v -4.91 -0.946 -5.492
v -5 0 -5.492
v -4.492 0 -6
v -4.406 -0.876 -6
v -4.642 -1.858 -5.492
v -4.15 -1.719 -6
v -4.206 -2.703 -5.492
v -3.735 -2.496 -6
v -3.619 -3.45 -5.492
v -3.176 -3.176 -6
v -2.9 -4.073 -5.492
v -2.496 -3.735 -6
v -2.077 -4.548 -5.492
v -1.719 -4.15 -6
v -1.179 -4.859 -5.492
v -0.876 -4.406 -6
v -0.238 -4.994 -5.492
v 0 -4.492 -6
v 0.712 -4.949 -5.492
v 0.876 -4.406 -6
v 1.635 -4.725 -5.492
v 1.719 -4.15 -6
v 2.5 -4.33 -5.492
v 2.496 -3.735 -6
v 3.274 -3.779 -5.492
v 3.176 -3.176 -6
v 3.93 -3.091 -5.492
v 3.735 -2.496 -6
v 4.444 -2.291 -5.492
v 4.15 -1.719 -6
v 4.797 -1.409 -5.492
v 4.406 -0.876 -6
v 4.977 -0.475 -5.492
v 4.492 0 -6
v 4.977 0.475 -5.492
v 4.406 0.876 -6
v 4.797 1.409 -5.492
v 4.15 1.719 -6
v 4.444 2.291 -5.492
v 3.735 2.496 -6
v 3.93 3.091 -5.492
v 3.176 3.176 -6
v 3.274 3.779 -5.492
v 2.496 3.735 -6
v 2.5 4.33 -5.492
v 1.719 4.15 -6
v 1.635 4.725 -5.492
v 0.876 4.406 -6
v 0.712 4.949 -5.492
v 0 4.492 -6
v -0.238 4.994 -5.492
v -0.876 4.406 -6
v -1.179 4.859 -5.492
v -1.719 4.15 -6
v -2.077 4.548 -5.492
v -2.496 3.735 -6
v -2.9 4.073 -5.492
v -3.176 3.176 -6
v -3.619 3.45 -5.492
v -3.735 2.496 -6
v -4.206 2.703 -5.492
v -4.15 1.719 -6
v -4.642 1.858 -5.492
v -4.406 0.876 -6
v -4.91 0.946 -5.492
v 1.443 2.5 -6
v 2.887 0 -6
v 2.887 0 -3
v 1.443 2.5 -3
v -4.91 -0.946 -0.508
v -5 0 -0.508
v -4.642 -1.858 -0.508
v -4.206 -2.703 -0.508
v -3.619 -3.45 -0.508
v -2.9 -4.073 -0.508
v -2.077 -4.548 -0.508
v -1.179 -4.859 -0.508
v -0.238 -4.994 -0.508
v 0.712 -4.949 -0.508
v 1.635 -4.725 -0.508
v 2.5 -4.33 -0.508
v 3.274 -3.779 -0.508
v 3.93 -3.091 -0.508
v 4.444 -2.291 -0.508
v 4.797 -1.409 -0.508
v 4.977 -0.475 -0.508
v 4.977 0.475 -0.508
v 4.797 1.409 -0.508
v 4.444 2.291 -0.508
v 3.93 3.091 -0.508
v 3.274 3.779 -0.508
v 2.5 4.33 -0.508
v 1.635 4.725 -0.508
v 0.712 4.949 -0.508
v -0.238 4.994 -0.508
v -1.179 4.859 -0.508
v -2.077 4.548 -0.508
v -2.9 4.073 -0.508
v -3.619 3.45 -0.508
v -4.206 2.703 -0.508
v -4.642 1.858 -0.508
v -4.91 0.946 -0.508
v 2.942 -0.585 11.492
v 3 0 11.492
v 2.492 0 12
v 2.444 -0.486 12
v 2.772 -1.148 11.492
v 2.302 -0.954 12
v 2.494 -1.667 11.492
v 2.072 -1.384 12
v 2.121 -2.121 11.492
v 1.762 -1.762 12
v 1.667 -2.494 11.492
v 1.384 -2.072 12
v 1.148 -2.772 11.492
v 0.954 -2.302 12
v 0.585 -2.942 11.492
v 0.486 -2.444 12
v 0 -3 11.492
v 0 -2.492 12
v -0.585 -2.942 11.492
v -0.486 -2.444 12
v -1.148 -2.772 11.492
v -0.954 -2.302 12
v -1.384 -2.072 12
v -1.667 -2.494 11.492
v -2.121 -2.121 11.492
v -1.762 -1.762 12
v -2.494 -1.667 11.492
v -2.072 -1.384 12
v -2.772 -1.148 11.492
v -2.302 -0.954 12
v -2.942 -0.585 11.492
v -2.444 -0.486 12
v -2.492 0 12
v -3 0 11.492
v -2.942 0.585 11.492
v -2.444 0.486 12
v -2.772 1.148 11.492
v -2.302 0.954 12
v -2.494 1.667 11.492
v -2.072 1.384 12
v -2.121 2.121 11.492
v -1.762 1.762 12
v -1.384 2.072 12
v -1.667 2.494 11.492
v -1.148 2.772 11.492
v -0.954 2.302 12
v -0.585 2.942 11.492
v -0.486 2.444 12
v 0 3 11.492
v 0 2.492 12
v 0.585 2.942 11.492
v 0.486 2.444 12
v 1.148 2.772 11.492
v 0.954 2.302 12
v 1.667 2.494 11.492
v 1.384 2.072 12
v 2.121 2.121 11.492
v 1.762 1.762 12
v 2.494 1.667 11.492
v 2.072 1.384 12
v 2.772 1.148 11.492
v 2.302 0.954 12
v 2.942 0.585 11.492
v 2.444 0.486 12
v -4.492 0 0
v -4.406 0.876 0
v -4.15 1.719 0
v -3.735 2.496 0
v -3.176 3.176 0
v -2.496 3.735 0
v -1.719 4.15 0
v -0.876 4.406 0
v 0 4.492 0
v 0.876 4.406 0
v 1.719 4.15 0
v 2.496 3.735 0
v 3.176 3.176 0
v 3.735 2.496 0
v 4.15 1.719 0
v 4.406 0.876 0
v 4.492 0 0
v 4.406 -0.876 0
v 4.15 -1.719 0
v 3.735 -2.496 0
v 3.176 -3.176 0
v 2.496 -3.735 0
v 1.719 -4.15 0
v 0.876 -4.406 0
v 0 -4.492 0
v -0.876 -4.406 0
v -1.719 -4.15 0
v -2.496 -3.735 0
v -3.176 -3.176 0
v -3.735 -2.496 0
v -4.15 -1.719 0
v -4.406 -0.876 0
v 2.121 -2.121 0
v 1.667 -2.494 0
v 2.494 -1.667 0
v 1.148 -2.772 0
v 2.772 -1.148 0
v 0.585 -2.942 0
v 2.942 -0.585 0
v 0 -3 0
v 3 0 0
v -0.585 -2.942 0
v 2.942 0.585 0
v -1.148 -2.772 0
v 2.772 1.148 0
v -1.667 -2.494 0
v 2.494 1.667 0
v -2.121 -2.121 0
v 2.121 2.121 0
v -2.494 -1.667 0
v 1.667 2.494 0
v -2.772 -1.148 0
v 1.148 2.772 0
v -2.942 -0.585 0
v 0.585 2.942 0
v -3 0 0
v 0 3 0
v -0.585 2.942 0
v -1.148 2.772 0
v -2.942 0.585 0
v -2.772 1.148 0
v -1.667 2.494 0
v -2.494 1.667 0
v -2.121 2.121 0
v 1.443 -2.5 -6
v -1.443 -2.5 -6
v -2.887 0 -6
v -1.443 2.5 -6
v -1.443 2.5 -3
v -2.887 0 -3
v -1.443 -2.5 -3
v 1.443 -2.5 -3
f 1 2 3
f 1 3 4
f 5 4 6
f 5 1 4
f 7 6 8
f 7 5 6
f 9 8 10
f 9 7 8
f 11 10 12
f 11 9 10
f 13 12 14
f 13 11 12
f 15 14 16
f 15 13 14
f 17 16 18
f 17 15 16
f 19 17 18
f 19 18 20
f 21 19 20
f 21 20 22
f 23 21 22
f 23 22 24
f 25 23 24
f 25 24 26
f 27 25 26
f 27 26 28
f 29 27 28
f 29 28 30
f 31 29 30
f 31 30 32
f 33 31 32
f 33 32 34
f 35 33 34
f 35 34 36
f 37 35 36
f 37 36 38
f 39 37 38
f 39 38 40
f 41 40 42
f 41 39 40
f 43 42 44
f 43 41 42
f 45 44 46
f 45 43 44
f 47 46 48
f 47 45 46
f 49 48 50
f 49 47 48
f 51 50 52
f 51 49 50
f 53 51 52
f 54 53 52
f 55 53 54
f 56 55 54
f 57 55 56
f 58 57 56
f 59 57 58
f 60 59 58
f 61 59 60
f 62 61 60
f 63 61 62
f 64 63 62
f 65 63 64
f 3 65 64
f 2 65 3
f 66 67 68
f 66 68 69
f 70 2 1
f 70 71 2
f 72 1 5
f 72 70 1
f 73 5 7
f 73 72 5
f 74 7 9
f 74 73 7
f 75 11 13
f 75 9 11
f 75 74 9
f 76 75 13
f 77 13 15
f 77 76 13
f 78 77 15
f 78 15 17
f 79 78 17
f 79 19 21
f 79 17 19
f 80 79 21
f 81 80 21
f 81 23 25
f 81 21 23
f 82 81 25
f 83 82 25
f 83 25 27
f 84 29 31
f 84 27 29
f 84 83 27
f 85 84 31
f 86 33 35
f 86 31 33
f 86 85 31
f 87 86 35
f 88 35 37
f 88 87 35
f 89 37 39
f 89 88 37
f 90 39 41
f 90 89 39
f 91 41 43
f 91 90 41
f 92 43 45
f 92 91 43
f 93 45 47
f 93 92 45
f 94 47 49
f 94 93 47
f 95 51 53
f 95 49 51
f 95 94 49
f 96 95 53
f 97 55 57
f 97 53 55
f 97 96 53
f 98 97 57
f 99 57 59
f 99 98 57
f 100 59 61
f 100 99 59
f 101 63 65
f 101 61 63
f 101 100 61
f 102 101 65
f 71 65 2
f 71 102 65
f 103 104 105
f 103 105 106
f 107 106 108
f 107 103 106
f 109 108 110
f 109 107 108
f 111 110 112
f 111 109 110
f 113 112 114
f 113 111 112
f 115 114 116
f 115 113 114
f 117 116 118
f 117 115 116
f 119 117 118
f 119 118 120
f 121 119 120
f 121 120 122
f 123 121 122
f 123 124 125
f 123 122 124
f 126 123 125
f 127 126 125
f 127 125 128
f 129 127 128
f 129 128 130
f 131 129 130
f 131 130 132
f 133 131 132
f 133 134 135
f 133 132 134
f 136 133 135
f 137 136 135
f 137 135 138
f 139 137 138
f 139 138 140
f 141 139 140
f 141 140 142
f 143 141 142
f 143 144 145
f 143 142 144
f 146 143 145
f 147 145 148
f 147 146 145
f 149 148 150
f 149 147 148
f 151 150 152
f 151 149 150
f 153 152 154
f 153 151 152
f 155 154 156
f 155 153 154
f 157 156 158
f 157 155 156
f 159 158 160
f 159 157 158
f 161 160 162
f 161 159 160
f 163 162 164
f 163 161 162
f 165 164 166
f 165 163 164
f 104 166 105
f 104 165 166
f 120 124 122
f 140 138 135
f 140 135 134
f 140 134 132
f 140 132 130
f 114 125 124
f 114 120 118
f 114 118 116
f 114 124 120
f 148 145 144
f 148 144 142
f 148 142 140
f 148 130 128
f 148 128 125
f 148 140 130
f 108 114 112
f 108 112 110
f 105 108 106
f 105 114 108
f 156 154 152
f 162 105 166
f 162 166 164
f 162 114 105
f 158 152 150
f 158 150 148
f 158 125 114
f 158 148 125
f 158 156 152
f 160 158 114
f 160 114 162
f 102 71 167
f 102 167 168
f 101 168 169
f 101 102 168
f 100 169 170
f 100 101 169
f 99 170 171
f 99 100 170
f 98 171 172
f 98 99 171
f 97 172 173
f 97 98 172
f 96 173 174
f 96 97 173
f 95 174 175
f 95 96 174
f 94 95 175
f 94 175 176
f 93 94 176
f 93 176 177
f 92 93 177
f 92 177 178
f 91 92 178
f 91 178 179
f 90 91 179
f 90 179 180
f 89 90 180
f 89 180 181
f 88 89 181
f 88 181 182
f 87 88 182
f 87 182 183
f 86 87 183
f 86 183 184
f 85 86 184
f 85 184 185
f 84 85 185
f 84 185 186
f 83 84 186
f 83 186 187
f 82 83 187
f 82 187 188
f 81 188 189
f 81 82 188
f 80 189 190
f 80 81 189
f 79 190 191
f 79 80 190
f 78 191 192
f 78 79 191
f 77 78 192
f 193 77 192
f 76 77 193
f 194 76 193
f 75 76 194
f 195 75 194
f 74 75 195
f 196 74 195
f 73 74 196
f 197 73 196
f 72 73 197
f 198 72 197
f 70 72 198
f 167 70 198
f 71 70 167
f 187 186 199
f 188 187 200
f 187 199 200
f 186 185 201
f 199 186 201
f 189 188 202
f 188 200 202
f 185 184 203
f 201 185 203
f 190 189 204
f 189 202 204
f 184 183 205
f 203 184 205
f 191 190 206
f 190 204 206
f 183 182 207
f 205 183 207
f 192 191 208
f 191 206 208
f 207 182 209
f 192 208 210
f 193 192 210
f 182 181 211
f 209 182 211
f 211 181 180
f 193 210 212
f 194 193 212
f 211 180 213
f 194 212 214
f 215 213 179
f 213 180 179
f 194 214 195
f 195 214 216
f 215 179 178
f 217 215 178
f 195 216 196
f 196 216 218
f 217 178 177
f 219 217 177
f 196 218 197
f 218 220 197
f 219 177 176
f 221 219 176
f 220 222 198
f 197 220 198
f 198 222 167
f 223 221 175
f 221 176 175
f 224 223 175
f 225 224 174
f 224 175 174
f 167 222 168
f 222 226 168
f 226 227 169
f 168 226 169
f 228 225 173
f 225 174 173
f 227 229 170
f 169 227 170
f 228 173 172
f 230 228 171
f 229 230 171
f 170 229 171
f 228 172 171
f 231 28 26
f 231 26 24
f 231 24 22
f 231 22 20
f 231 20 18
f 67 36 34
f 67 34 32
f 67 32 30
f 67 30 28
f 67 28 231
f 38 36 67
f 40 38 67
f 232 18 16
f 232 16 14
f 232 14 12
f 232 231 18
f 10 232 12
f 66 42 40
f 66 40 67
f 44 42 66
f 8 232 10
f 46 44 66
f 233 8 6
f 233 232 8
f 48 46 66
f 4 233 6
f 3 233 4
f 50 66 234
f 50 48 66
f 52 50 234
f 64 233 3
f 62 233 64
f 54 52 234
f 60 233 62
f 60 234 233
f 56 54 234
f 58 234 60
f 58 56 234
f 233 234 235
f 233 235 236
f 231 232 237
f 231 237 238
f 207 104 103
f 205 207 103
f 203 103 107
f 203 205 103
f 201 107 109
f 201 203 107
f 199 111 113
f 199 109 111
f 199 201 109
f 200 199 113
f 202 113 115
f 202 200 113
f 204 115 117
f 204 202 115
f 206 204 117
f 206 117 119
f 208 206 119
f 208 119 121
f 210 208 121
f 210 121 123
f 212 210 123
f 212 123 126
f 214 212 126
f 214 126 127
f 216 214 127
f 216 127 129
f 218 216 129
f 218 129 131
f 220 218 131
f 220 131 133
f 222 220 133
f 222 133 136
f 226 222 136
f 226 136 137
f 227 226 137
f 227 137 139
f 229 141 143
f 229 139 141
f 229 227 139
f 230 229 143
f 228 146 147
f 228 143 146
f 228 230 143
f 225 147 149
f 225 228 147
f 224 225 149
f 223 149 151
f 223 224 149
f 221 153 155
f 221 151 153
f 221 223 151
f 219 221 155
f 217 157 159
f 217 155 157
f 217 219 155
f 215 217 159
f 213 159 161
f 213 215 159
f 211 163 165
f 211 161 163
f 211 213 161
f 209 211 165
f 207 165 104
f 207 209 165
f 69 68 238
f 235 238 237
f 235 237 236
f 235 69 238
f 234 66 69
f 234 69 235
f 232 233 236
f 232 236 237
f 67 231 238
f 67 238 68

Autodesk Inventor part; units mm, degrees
ref_plane "YZ Plane" through (0, 0, 0) normal (1, 0, 0) x (0, 1, 0)
ref_plane "XZ Plane" through (0, 0, 0) normal (0, 1, 0) x (-1, 0, 0)
ref_plane "XY Plane" through (0, 0, 0) normal (0, 0, 1) x (1, 0, 0)
sketch "Sketch1" plane through (0, 0, 0) normal (0, 0, 1) x (1, 0, 0)
  circle A0 centre (0, 0) radius 3
  dimension "d0" = 6
extrude "Extrusion1" add sketch "Sketch1" along normal blind 12
sketch "Sketch2" plane through (0, 0, 0) normal (0, 0, -1) x (-1, 0, 0)
  circle A0 centre (0, 0) radius 3 projected
  circle A1 centre (0, 0) radius 5
  dimension "d3" = 10
extrude "Extrusion2" add sketch "Sketch2" along normal blind 6 contours A0 | A1
sketch "Sketch3" plane through (0, 0, -6) normal (0, 0, -1) x (-1, 0, 0)
  circle A0 centre (0, 0) radius 5 projected
  line L0 (-1.4434, 2.5) -> (1.4434, 2.5)
  line L1 (1.4434, 2.5) -> (2.8868, 0)
  line L2 (2.8868, 0) -> (1.4434, -2.5)
  line L3 (1.4434, -2.5) -> (-1.4434, -2.5)
  line L4 (-1.4434, -2.5) -> (-2.8868, 0)
  line L5 (-2.8868, 0) -> (-1.4434, 2.5)
  dimension "d6" = 5
extrude "Extrusion3" cut sketch "Sketch3" against normal blind 3 contours L0 L1 L2 L3 L4 L5
thread "Thread1" size "M6x1" class "6g" standard "ANSI Metric M Profile" full length
chamfer "Chamfer1" distance 0.508 angle 45 3 edges at (5, 0, -6) (5, 0, 0) (-3, 0, 12)
properties part number "M6 x 12mm" material "Steel"
